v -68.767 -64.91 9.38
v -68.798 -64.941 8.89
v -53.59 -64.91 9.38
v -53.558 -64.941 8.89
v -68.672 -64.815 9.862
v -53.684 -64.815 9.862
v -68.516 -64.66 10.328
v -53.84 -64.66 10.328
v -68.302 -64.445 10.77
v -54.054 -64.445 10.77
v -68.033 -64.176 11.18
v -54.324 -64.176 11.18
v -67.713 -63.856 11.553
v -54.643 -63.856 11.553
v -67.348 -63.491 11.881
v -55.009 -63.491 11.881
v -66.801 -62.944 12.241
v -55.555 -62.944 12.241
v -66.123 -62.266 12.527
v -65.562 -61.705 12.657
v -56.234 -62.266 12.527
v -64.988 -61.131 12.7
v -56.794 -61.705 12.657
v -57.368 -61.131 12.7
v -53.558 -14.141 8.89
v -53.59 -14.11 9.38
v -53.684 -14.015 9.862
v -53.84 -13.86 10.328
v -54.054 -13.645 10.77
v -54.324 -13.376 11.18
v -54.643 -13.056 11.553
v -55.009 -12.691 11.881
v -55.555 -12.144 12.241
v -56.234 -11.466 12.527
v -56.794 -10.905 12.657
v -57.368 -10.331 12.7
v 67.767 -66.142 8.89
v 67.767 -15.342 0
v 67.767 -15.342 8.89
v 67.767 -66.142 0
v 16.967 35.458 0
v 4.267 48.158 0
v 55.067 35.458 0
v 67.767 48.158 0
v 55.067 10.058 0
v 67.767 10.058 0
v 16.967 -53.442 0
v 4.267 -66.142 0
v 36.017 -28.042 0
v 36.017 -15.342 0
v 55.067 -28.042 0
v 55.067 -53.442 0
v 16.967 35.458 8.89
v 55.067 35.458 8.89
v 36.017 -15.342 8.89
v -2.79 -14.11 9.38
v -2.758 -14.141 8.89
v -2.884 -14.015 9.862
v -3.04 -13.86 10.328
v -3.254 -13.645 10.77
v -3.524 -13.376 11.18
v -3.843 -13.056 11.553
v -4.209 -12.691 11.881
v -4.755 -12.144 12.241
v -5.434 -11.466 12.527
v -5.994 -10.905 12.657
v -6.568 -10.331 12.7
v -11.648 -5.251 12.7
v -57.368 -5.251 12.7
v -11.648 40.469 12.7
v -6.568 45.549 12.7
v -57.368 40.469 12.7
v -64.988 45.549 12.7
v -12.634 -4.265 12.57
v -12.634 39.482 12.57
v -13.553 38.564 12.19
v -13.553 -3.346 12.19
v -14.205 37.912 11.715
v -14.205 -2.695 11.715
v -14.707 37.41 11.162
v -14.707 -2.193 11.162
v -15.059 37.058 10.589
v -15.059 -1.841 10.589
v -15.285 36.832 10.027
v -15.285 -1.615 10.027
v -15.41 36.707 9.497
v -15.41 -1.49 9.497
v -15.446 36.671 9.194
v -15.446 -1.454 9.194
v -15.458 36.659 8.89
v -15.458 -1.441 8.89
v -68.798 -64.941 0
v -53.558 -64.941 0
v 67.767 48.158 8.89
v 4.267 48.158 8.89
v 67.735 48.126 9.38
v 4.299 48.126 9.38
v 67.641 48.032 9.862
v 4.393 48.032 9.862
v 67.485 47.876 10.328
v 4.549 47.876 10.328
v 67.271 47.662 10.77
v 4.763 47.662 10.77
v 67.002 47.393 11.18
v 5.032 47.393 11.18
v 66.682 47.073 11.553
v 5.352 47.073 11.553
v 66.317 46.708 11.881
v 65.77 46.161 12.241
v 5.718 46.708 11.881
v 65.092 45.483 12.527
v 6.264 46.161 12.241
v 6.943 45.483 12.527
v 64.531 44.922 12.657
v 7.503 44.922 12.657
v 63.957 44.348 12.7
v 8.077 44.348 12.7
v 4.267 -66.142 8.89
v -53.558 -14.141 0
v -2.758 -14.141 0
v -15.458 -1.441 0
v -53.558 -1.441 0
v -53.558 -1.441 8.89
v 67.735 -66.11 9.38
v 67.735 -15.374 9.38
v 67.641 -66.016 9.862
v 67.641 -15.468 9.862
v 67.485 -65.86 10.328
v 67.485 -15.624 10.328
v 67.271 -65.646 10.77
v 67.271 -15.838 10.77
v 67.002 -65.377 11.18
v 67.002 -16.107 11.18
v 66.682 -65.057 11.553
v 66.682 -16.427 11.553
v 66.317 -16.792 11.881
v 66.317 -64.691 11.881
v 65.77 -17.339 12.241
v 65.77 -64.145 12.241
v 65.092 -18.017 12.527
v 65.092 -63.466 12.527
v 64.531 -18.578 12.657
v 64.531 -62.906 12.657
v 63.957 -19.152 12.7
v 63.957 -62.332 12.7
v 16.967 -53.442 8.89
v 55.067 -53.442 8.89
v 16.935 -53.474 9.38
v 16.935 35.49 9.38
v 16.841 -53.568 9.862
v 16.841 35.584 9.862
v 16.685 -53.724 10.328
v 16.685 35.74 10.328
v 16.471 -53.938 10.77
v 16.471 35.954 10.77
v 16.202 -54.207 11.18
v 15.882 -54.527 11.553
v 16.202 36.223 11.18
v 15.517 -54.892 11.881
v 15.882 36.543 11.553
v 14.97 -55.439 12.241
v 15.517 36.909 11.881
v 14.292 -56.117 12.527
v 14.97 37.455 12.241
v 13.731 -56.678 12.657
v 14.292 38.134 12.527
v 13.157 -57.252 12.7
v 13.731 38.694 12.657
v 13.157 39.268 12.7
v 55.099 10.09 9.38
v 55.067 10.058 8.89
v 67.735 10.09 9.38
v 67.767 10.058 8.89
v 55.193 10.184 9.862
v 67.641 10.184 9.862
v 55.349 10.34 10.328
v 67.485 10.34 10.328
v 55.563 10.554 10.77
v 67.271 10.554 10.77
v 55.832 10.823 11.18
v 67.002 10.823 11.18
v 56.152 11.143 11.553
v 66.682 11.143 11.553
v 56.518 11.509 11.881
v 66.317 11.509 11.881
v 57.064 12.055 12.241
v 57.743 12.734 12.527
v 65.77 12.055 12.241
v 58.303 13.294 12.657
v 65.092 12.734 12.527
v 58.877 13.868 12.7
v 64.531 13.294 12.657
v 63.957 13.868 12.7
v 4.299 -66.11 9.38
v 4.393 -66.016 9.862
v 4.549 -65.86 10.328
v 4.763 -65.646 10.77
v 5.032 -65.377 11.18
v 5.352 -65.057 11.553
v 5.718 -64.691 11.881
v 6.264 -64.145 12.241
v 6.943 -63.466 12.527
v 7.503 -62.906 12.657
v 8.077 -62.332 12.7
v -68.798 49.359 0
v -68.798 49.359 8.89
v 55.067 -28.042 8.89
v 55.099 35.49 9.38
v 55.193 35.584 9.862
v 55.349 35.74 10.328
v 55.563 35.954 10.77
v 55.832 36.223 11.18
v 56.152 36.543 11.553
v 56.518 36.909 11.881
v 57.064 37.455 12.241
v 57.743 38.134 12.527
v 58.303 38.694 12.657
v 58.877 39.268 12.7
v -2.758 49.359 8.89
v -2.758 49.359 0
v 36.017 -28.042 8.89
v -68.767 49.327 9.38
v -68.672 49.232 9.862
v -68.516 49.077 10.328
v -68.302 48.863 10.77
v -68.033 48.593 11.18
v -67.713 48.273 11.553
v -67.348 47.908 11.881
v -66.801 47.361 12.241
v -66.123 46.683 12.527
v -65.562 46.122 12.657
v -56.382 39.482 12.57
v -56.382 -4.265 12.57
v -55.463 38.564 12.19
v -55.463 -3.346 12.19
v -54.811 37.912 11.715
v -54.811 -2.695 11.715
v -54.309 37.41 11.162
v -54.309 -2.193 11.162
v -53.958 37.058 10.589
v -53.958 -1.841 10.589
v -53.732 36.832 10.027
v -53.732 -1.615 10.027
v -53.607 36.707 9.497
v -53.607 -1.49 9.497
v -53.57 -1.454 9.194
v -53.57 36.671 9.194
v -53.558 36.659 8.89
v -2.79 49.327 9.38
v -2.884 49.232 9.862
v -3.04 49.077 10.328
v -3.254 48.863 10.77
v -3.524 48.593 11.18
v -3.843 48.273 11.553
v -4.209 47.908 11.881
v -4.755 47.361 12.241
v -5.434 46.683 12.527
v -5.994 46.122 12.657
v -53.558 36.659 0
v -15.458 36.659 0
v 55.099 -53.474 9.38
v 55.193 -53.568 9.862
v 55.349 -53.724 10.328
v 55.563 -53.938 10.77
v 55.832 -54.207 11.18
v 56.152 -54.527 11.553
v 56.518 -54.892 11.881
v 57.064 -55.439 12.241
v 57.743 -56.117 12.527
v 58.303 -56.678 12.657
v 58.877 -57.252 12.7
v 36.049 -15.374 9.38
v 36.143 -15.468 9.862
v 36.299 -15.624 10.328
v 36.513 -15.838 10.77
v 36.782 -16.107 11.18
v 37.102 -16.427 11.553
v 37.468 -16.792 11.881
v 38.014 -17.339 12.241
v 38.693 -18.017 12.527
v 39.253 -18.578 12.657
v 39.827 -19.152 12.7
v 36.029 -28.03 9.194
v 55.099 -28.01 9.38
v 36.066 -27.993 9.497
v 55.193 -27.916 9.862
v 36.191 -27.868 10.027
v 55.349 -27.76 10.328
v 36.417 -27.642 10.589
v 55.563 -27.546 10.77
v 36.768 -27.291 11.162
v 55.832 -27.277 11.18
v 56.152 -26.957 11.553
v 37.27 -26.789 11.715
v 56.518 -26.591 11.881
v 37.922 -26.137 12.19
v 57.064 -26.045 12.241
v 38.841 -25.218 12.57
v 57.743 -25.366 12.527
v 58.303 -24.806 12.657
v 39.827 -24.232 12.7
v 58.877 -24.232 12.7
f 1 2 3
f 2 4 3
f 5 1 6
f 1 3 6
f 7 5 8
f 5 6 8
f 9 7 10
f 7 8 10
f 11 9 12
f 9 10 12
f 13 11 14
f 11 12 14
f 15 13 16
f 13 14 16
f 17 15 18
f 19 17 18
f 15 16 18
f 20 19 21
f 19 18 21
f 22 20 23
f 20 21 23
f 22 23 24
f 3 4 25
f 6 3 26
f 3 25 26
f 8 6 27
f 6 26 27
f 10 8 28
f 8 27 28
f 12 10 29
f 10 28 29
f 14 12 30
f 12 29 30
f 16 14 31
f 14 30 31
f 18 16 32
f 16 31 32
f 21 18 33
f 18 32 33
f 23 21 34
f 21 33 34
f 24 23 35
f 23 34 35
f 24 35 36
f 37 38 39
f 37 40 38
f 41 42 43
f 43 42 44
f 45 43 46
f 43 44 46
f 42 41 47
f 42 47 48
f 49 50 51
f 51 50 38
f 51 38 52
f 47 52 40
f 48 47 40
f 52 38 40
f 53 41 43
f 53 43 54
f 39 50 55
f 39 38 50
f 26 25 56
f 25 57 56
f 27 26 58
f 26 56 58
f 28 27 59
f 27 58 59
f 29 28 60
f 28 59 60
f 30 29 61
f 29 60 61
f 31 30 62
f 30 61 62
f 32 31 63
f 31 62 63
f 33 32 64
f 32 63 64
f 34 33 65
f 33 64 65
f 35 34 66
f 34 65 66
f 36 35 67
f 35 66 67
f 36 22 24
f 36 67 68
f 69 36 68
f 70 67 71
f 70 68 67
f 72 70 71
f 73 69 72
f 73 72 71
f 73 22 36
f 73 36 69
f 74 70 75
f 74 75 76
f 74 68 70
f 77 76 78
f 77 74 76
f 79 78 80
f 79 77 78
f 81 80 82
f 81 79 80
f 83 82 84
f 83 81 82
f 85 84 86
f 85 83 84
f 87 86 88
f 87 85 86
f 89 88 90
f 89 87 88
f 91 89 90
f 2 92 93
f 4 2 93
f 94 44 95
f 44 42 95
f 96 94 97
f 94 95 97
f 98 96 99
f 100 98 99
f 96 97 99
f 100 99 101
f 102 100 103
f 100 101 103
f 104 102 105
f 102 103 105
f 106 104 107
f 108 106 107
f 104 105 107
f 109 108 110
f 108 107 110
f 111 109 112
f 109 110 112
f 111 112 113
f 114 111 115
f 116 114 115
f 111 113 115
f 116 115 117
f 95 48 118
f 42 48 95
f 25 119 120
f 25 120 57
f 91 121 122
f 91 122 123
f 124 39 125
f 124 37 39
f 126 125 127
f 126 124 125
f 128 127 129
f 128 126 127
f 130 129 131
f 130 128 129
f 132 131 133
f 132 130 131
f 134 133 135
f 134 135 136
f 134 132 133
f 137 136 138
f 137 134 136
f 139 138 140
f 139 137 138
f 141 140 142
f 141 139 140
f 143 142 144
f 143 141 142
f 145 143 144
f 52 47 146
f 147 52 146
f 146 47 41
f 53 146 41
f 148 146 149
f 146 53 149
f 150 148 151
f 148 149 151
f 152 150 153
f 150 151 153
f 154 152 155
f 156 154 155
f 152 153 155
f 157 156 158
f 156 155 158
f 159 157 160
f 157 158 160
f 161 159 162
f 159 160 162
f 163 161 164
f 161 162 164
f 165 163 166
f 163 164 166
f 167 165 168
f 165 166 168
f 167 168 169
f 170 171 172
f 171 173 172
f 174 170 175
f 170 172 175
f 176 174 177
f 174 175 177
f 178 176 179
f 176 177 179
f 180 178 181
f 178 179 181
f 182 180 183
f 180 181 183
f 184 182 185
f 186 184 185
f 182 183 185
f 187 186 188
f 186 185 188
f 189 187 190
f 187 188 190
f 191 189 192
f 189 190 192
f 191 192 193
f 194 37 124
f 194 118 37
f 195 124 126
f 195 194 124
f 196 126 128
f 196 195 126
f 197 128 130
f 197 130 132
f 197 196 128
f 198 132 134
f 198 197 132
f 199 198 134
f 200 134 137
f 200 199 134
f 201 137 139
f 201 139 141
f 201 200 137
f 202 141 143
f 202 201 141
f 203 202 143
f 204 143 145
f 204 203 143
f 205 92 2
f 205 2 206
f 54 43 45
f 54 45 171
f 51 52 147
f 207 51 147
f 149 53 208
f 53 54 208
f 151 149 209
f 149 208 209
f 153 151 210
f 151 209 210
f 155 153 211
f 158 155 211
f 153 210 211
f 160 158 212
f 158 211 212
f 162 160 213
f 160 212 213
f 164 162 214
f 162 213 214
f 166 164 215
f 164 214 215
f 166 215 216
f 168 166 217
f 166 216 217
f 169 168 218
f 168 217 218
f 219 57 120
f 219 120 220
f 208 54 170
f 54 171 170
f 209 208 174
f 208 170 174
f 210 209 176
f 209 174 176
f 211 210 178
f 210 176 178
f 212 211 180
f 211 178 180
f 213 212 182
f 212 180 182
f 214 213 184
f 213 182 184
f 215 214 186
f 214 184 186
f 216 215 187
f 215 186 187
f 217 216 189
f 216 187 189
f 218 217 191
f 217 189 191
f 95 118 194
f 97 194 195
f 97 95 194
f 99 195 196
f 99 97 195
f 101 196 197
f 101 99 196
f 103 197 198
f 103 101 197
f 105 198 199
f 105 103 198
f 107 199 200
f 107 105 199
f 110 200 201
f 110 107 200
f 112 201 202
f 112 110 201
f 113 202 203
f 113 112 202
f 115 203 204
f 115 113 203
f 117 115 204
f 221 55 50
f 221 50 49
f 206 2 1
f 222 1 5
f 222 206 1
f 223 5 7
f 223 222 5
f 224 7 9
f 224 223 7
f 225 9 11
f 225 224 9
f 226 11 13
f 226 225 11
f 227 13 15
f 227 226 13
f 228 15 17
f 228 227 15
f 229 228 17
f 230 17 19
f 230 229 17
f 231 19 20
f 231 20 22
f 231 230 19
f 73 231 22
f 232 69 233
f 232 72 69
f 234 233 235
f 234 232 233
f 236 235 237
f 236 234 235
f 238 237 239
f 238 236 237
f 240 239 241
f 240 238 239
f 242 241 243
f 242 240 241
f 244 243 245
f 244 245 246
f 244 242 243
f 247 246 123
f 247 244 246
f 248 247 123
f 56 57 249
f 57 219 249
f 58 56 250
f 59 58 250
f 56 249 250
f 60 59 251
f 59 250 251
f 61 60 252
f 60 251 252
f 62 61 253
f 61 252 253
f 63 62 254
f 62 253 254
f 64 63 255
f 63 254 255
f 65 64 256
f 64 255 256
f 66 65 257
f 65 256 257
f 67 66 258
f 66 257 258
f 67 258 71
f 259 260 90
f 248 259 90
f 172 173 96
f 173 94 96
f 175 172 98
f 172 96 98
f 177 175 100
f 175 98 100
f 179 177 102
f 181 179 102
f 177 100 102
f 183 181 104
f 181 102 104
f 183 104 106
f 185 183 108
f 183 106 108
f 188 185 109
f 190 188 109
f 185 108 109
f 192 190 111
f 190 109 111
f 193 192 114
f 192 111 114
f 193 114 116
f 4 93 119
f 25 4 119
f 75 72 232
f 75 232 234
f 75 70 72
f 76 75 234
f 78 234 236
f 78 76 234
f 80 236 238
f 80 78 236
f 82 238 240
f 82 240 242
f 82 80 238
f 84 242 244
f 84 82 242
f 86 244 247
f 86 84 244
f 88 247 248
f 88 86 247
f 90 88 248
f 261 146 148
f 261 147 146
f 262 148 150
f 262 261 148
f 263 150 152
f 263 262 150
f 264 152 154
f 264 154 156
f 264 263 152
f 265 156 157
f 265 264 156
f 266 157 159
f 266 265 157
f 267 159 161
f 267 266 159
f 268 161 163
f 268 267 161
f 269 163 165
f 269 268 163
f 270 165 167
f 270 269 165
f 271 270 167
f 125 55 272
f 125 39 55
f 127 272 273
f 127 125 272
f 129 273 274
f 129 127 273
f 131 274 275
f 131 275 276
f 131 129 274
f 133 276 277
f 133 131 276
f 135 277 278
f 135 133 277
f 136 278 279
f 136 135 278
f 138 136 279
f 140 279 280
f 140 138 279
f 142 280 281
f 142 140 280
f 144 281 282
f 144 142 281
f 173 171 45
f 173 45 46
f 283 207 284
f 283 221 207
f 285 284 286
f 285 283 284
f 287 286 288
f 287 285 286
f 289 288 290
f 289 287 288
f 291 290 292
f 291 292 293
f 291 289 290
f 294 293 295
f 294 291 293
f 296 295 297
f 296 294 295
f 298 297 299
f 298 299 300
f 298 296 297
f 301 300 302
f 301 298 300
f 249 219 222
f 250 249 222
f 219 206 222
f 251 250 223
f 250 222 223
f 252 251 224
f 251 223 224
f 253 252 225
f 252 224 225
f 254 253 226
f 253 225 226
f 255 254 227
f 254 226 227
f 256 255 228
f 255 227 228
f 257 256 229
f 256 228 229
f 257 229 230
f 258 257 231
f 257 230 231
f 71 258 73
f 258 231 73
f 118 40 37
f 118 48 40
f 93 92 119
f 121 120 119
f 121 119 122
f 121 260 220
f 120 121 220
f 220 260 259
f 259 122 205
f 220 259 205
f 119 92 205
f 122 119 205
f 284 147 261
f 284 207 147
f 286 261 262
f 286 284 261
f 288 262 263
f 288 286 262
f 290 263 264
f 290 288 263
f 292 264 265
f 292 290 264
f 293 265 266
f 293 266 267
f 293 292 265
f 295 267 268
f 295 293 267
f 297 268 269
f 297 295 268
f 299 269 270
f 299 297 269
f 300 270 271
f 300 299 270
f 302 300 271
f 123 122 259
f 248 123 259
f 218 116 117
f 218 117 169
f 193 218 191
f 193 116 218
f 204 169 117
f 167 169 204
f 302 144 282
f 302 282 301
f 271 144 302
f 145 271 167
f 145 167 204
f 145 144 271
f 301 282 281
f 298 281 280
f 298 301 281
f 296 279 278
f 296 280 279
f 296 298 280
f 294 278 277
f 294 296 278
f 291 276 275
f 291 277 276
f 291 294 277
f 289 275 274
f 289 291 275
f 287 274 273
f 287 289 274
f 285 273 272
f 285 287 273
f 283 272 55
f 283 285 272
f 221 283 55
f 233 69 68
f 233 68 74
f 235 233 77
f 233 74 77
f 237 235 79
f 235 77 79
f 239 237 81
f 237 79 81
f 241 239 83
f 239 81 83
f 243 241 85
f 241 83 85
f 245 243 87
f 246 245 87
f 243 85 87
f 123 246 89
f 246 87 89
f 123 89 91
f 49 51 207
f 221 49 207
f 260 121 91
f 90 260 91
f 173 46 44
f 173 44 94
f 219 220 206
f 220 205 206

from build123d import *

# Parameters (mm, degrees)
F0_W      = 15.24
F0_H      = 114.3
F1_DEPTH  = 12.7
F2_W      = 12.7
F2_H      = 12.7
F3_DEPTH  = 50.8
F4_W      = 12.7
F4_H      = 12.7
F5_DEPTH  = 38.1
F6_W      = 12.7
F6_H      = 12.7
F7_DEPTH  = 50.8
F8_W      = 12.7
F8_H      = 114.3
F9_DEPTH  = 12.7
F10_W     = 12.7
F10_H     = 12.7
F11_DEPTH = 50.8
F12_W     = 12.7
F12_H     = 12.7
F13_DEPTH = 25.4
F14_W     = 12.7
F14_H     = 12.7
F15_DEPTH = 50.8
F16_W     = 12.7
F16_H     = 12.7
F17_DEPTH = 38.1
F18_W     = 12.7
F18_H     = 12.7
F19_DEPTH = 19.05
F20_R     = 3.81
F20_2_R   = 3.81


with BuildPart() as f1:
    # F0 (on Top) → F1 (new body)
    with BuildSketch(Plane.XY):
        with Locations((-61.178183, -7.791479)):
            Rectangle(F0_W, F0_H)
    extrude(amount=F1_DEPTH)

    # F2 (on face) → F3 (join)
    with BuildSketch(Plane.YZ.offset(-53.558183)):
        with Locations((43.008521, 6.35)):
            Rectangle(F2_W, F2_H)
    extrude(amount=F3_DEPTH)

    # F4 (on face) → F5 (join)
    with BuildSketch(Plane.XZ.offset(-36.658521)):
        with Locations((-9.108183, 6.35)):
            Rectangle(F4_W, F4_H)
    extrude(amount=F5_DEPTH)

    # F6 (on face) → F7 (join)
    with BuildSketch(Plane.YZ.offset(-53.558183)):
        with Locations((-7.791479, 6.35)):
            Rectangle(F6_W, F6_H)
    extrude(amount=F7_DEPTH)

    # F20
    f20_edges = [f1.edges().sort_by_distance(p)[0] for p in [
        (-53.558183, -39.541479, 12.7),
        (-28.158183, -14.141479, 12.7),
        (-2.758183, 17.608521, 12.7),
        (-35.778183, 49.358521, 12.7),
        (-68.798183, -7.791479, 12.7),
        (-61.178183, -64.941479, 12.7),
        (-53.558183, 17.608521, 12.7),
        (-34.508183, 36.658521, 12.7),
        (-15.458183, 17.608521, 12.7),
        (-34.508183, -1.441479, 12.7),
    ]]
    fillet(f20_edges, radius=F20_R)


with BuildPart() as f9:
    # F8 (on Top) → F9 (new body)
    with BuildSketch(Plane.XY):
        with Locations((10.617082, -8.991873)):
            Rectangle(F8_W, F8_H)
    extrude(amount=F9_DEPTH)

    # F10 (on face) → F11 (join)
    with BuildSketch(Plane.YZ.offset(16.967082)):
        with Locations((41.808127, 6.35)):
            Rectangle(F10_W, F10_H)
    extrude(amount=F11_DEPTH)

    # F12 (on face) → F13 (join)
    with BuildSketch(Plane.XZ.offset(-35.458127)):
        with Locations((61.417082, 6.35)):
            Rectangle(F12_W, F12_H)
    extrude(amount=F13_DEPTH)

    # F14 (on face) → F15 (join)
    with BuildSketch(Plane.YZ.offset(16.967082)):
        with Locations((-59.791873, 6.35)):
            Rectangle(F14_W, F14_H)
    extrude(amount=F15_DEPTH)

    # F16 (on face) → F17 (join)
    with BuildSketch(Plane(origin=(0, -53.441873, 0), x_dir=(-1, 0, 0), z_dir=(0, 1, 0))):
        with Locations((-61.417082, 6.35)):
            Rectangle(F16_W, F16_H)
    extrude(amount=F17_DEPTH)

    # F18 (on face) → F19 (join)
    with BuildSketch(Plane(origin=(55.067082, 0, 0), x_dir=(0, -1, 0), z_dir=(-1, 0, 0))):
        with Locations((21.691873, 6.35)):
            Rectangle(F18_W, F18_H)
    extrude(amount=F19_DEPTH)

    # F20#2
    f20_2_edges = [f9.edges().sort_by_distance(p)[0] for p in [
        (16.967082, -8.991873, 12.7),
        (36.017082, 35.458127, 12.7),
        (55.067082, 22.758127, 12.7),
        (61.417082, 10.058127, 12.7),
        (67.767082, 29.108127, 12.7),
        (36.017082, 48.158127, 12.7),
        (4.267082, -8.991873, 12.7),
        (36.017082, -66.141873, 12.7),
        (67.767082, -40.741873, 12.7),
        (51.892082, -15.341873, 12.7),
        (36.017082, -21.691873, 12.7),
        (45.542082, -28.041873, 12.7),
        (55.067082, -40.741873, 12.7),
        (36.017082, -53.441873, 12.7),
    ]]
    fillet(f20_2_edges, radius=F20_2_R)


solid = Compound([f1.part, f9.part])
